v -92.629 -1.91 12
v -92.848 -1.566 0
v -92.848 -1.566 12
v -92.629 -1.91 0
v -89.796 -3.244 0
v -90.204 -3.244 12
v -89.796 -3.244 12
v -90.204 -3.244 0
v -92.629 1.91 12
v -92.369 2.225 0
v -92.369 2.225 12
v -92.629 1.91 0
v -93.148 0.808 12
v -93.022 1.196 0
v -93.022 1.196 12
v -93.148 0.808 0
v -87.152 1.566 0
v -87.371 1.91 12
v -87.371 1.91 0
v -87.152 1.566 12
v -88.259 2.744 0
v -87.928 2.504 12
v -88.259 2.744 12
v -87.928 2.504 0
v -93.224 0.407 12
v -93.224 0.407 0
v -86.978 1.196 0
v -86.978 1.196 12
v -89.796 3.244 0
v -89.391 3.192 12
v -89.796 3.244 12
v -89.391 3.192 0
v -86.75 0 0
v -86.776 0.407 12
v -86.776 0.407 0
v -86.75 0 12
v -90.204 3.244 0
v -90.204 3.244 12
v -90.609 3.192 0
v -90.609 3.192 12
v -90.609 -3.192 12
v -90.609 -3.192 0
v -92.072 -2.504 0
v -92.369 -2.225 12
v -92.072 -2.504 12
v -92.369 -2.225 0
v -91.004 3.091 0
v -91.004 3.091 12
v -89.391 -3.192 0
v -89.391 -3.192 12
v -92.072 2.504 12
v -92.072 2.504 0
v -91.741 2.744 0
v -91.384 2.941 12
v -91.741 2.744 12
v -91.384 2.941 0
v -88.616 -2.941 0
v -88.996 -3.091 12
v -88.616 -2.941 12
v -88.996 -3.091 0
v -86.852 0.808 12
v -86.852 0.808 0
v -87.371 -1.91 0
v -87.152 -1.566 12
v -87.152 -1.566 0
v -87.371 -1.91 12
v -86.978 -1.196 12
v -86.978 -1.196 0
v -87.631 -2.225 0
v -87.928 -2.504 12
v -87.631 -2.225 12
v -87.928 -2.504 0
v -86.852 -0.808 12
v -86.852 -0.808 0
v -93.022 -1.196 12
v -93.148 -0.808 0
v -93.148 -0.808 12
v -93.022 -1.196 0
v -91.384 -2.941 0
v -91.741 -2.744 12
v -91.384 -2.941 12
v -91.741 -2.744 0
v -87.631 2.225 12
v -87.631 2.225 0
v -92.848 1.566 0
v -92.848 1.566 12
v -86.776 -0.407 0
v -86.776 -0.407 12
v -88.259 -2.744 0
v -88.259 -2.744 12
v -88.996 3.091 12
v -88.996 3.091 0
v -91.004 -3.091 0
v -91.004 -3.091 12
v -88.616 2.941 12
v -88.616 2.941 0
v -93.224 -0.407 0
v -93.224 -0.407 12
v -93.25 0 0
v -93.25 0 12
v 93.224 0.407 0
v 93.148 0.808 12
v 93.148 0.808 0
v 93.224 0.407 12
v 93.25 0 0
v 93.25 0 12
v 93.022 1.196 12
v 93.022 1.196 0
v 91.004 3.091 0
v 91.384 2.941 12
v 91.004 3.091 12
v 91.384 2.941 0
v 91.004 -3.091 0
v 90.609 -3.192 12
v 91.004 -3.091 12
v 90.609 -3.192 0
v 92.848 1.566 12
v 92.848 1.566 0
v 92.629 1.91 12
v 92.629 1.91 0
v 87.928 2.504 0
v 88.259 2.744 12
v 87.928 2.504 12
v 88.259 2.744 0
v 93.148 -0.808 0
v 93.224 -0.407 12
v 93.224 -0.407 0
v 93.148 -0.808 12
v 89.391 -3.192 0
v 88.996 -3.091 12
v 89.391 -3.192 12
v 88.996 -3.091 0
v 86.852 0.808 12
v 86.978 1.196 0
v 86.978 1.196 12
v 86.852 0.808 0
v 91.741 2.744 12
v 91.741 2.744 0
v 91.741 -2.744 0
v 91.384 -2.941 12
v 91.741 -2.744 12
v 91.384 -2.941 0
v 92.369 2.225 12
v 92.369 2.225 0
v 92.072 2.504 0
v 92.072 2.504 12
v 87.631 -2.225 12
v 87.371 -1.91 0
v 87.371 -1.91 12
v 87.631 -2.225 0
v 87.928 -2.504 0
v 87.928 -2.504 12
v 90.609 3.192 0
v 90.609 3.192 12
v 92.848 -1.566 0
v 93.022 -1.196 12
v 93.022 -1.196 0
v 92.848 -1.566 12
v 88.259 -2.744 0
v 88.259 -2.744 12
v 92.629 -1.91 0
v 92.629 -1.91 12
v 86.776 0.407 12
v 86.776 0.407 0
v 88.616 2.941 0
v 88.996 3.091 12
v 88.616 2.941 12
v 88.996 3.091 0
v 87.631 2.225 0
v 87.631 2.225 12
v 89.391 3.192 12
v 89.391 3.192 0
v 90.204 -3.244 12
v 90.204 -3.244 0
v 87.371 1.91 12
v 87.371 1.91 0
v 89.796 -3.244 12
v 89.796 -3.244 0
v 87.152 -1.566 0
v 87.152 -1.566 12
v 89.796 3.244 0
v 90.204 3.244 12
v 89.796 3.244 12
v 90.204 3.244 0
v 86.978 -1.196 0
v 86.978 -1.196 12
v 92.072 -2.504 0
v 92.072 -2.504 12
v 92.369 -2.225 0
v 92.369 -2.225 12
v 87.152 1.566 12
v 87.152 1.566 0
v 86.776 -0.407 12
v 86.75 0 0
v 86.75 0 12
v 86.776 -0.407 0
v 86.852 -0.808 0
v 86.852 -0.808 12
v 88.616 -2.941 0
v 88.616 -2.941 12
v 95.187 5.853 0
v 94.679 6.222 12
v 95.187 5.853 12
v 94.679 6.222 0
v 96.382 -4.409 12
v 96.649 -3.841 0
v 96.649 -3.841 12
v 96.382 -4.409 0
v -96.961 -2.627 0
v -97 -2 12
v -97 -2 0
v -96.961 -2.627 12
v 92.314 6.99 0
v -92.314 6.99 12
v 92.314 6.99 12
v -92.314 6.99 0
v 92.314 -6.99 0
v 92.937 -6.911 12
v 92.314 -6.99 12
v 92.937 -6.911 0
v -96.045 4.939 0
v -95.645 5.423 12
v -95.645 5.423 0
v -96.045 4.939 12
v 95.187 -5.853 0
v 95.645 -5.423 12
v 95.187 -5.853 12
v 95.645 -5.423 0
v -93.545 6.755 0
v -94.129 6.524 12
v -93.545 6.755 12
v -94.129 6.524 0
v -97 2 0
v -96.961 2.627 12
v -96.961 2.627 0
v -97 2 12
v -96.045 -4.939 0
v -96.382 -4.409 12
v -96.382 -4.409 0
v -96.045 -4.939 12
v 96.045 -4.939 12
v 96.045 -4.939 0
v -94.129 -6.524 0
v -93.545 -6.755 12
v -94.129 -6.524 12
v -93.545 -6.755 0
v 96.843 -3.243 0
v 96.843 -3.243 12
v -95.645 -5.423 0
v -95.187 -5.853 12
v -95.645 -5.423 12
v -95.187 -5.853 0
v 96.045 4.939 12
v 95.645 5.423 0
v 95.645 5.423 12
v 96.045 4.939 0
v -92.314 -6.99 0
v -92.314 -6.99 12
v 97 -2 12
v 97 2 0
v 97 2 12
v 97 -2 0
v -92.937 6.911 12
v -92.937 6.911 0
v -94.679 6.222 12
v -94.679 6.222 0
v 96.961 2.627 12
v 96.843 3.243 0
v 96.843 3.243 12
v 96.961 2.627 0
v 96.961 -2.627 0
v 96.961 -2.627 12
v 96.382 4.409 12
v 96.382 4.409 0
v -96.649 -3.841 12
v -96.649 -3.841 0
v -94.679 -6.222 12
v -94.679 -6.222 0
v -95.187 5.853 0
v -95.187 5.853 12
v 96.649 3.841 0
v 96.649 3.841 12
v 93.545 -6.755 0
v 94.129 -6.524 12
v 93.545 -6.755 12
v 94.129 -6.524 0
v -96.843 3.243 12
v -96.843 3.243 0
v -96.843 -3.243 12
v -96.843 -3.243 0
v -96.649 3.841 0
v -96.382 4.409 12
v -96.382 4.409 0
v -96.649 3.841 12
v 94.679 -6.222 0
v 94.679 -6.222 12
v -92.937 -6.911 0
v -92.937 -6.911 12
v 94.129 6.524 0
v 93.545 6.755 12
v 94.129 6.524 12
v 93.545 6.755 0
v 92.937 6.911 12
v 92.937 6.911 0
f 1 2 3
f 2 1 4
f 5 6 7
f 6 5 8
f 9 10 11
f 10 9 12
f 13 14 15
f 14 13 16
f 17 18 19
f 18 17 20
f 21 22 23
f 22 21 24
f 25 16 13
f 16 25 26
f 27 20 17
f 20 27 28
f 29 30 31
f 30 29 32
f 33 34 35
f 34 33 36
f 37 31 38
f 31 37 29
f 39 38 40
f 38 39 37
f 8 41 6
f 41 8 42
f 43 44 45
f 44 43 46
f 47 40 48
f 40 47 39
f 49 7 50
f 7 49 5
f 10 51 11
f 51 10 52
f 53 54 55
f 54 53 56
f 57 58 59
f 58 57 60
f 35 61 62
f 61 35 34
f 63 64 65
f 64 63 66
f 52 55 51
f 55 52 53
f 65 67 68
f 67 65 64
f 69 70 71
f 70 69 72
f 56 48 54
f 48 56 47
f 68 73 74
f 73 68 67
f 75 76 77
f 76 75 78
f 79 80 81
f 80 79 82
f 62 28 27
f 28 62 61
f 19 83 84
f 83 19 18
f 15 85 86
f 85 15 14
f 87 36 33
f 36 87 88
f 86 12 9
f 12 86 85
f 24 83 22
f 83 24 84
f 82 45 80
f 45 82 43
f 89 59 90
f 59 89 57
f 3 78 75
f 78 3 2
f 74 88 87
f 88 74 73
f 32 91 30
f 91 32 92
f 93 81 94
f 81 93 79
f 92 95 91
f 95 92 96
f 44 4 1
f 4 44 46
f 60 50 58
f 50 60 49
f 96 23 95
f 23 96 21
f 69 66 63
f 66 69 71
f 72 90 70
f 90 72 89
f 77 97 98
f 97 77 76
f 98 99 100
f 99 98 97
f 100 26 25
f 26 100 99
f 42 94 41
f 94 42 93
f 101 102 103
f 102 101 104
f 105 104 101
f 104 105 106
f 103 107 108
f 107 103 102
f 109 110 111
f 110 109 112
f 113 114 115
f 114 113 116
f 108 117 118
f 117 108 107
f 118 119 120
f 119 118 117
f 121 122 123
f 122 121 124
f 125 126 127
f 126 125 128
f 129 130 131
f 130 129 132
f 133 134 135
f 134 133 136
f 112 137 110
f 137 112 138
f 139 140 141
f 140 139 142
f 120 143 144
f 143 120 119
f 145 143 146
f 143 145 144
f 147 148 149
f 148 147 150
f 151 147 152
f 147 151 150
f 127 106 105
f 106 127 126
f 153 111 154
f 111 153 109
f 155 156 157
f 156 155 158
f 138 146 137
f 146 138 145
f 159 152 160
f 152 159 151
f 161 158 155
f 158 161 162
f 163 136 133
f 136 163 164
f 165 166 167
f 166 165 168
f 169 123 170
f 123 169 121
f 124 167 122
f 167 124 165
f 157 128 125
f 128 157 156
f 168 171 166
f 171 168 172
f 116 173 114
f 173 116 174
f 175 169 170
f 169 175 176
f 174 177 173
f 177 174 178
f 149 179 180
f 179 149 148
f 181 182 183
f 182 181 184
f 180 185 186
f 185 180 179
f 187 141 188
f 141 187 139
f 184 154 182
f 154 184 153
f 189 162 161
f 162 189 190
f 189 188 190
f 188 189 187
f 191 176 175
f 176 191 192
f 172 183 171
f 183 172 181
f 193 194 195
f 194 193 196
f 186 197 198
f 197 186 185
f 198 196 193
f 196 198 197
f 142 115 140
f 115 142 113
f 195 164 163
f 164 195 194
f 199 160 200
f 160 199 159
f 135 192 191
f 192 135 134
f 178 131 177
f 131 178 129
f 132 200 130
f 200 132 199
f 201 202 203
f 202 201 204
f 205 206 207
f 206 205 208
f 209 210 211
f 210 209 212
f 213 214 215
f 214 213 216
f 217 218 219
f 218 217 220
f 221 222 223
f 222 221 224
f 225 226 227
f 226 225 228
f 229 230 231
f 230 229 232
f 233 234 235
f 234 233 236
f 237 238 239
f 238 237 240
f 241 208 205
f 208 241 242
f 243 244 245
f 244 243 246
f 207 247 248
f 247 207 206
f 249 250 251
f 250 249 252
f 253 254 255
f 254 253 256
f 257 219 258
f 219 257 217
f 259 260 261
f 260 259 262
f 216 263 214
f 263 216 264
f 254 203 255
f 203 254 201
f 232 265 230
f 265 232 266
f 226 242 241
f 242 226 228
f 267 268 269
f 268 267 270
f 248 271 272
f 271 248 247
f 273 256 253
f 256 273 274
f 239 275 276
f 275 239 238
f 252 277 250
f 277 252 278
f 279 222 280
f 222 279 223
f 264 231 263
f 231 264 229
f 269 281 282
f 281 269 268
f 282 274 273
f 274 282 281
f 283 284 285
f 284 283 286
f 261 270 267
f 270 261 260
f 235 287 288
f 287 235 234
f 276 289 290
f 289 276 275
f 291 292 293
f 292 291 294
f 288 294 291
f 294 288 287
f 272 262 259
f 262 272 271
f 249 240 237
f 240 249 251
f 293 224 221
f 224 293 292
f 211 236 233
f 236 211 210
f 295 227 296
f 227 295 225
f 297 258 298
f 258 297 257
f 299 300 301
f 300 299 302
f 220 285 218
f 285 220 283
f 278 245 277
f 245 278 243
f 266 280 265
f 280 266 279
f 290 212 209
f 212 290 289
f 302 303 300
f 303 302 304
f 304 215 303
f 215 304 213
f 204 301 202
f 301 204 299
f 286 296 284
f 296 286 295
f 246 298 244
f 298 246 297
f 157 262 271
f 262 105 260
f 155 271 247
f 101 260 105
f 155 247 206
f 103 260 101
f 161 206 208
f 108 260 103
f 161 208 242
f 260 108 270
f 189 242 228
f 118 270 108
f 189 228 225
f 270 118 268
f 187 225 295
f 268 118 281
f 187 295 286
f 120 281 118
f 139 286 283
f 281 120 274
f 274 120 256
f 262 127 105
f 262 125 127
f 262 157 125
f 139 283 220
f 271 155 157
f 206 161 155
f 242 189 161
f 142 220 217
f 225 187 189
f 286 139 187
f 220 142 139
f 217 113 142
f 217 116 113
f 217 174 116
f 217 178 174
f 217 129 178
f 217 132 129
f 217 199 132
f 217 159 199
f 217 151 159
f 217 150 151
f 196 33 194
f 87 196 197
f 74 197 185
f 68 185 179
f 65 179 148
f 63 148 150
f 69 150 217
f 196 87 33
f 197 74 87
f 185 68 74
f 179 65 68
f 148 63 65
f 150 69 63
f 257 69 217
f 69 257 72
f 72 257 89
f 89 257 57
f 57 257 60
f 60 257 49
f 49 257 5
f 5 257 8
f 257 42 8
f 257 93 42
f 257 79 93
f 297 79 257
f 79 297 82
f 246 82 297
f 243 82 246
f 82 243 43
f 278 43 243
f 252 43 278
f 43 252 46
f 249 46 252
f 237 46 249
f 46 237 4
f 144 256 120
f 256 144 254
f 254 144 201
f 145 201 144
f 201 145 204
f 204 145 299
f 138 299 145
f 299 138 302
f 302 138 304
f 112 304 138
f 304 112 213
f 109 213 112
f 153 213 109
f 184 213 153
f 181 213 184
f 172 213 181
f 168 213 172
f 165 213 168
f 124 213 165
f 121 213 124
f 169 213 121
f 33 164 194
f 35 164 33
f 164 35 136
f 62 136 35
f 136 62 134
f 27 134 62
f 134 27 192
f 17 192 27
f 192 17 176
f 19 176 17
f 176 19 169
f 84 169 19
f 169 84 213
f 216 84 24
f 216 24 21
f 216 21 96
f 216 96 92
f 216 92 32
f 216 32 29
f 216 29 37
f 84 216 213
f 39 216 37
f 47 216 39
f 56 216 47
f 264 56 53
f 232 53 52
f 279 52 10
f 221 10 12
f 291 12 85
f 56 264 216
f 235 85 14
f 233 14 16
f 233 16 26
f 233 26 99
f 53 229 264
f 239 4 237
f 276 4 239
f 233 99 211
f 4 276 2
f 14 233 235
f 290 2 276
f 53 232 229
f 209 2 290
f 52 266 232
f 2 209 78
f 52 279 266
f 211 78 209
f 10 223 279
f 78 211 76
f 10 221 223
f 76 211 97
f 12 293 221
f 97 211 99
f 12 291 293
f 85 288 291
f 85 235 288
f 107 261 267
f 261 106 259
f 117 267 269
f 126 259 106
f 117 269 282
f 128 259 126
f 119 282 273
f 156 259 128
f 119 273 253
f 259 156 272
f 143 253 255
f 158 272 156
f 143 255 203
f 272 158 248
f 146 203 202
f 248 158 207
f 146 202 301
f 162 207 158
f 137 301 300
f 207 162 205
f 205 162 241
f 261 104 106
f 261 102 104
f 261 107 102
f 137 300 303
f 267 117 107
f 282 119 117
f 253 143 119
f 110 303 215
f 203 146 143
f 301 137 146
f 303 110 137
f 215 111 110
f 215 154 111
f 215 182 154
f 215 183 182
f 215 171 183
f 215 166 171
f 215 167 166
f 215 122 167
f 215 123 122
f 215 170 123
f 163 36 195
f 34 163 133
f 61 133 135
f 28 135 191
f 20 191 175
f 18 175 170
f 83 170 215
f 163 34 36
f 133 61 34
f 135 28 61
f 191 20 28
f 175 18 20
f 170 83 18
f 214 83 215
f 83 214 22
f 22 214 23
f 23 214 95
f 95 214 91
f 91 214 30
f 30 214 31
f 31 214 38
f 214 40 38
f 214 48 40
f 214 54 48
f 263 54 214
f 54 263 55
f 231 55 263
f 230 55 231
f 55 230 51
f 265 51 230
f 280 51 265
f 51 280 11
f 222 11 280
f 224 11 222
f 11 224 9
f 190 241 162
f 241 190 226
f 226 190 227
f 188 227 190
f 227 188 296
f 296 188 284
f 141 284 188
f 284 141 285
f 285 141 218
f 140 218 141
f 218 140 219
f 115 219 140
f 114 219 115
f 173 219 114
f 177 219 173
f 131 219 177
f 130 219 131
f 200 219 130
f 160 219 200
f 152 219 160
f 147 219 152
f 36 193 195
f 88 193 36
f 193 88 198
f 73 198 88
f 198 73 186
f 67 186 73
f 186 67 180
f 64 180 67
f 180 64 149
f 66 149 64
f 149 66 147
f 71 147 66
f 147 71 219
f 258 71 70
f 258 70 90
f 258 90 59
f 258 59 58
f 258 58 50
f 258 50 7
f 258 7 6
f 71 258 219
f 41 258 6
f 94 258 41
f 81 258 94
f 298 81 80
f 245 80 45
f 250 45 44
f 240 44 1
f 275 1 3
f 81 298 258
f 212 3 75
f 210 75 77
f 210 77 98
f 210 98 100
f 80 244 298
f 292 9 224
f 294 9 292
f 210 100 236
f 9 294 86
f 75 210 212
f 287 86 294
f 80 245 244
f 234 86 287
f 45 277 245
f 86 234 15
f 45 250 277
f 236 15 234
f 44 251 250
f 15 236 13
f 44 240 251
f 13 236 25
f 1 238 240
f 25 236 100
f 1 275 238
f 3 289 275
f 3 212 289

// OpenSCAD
$fn = 50;


difference() {
	union() {
		hull() {
			translate(v = [-92.0000000000, 2.0000000000, 0]) {
				cylinder(h = 12, r = 5);
			}
			translate(v = [92.0000000000, 2.0000000000, 0]) {
				cylinder(h = 12, r = 5);
			}
			translate(v = [-92.0000000000, -2.0000000000, 0]) {
				cylinder(h = 12, r = 5);
			}
			translate(v = [92.0000000000, -2.0000000000, 0]) {
				cylinder(h = 12, r = 5);
			}
		}
	}
	union() {
		translate(v = [-90.0000000000, 0.0000000000, -100.0000000000]) {
			cylinder(h = 200, r = 3.2500000000);
		}
		translate(v = [-90.0000000000, 0.0000000000, -100.0000000000]) {
			cylinder(h = 200, r = 3.2500000000);
		}
		translate(v = [90.0000000000, 0.0000000000, -100.0000000000]) {
			cylinder(h = 200, r = 3.2500000000);
		}
		translate(v = [90.0000000000, 0.0000000000, -100.0000000000]) {
			cylinder(h = 200, r = 3.2500000000);
		}
	}
}
